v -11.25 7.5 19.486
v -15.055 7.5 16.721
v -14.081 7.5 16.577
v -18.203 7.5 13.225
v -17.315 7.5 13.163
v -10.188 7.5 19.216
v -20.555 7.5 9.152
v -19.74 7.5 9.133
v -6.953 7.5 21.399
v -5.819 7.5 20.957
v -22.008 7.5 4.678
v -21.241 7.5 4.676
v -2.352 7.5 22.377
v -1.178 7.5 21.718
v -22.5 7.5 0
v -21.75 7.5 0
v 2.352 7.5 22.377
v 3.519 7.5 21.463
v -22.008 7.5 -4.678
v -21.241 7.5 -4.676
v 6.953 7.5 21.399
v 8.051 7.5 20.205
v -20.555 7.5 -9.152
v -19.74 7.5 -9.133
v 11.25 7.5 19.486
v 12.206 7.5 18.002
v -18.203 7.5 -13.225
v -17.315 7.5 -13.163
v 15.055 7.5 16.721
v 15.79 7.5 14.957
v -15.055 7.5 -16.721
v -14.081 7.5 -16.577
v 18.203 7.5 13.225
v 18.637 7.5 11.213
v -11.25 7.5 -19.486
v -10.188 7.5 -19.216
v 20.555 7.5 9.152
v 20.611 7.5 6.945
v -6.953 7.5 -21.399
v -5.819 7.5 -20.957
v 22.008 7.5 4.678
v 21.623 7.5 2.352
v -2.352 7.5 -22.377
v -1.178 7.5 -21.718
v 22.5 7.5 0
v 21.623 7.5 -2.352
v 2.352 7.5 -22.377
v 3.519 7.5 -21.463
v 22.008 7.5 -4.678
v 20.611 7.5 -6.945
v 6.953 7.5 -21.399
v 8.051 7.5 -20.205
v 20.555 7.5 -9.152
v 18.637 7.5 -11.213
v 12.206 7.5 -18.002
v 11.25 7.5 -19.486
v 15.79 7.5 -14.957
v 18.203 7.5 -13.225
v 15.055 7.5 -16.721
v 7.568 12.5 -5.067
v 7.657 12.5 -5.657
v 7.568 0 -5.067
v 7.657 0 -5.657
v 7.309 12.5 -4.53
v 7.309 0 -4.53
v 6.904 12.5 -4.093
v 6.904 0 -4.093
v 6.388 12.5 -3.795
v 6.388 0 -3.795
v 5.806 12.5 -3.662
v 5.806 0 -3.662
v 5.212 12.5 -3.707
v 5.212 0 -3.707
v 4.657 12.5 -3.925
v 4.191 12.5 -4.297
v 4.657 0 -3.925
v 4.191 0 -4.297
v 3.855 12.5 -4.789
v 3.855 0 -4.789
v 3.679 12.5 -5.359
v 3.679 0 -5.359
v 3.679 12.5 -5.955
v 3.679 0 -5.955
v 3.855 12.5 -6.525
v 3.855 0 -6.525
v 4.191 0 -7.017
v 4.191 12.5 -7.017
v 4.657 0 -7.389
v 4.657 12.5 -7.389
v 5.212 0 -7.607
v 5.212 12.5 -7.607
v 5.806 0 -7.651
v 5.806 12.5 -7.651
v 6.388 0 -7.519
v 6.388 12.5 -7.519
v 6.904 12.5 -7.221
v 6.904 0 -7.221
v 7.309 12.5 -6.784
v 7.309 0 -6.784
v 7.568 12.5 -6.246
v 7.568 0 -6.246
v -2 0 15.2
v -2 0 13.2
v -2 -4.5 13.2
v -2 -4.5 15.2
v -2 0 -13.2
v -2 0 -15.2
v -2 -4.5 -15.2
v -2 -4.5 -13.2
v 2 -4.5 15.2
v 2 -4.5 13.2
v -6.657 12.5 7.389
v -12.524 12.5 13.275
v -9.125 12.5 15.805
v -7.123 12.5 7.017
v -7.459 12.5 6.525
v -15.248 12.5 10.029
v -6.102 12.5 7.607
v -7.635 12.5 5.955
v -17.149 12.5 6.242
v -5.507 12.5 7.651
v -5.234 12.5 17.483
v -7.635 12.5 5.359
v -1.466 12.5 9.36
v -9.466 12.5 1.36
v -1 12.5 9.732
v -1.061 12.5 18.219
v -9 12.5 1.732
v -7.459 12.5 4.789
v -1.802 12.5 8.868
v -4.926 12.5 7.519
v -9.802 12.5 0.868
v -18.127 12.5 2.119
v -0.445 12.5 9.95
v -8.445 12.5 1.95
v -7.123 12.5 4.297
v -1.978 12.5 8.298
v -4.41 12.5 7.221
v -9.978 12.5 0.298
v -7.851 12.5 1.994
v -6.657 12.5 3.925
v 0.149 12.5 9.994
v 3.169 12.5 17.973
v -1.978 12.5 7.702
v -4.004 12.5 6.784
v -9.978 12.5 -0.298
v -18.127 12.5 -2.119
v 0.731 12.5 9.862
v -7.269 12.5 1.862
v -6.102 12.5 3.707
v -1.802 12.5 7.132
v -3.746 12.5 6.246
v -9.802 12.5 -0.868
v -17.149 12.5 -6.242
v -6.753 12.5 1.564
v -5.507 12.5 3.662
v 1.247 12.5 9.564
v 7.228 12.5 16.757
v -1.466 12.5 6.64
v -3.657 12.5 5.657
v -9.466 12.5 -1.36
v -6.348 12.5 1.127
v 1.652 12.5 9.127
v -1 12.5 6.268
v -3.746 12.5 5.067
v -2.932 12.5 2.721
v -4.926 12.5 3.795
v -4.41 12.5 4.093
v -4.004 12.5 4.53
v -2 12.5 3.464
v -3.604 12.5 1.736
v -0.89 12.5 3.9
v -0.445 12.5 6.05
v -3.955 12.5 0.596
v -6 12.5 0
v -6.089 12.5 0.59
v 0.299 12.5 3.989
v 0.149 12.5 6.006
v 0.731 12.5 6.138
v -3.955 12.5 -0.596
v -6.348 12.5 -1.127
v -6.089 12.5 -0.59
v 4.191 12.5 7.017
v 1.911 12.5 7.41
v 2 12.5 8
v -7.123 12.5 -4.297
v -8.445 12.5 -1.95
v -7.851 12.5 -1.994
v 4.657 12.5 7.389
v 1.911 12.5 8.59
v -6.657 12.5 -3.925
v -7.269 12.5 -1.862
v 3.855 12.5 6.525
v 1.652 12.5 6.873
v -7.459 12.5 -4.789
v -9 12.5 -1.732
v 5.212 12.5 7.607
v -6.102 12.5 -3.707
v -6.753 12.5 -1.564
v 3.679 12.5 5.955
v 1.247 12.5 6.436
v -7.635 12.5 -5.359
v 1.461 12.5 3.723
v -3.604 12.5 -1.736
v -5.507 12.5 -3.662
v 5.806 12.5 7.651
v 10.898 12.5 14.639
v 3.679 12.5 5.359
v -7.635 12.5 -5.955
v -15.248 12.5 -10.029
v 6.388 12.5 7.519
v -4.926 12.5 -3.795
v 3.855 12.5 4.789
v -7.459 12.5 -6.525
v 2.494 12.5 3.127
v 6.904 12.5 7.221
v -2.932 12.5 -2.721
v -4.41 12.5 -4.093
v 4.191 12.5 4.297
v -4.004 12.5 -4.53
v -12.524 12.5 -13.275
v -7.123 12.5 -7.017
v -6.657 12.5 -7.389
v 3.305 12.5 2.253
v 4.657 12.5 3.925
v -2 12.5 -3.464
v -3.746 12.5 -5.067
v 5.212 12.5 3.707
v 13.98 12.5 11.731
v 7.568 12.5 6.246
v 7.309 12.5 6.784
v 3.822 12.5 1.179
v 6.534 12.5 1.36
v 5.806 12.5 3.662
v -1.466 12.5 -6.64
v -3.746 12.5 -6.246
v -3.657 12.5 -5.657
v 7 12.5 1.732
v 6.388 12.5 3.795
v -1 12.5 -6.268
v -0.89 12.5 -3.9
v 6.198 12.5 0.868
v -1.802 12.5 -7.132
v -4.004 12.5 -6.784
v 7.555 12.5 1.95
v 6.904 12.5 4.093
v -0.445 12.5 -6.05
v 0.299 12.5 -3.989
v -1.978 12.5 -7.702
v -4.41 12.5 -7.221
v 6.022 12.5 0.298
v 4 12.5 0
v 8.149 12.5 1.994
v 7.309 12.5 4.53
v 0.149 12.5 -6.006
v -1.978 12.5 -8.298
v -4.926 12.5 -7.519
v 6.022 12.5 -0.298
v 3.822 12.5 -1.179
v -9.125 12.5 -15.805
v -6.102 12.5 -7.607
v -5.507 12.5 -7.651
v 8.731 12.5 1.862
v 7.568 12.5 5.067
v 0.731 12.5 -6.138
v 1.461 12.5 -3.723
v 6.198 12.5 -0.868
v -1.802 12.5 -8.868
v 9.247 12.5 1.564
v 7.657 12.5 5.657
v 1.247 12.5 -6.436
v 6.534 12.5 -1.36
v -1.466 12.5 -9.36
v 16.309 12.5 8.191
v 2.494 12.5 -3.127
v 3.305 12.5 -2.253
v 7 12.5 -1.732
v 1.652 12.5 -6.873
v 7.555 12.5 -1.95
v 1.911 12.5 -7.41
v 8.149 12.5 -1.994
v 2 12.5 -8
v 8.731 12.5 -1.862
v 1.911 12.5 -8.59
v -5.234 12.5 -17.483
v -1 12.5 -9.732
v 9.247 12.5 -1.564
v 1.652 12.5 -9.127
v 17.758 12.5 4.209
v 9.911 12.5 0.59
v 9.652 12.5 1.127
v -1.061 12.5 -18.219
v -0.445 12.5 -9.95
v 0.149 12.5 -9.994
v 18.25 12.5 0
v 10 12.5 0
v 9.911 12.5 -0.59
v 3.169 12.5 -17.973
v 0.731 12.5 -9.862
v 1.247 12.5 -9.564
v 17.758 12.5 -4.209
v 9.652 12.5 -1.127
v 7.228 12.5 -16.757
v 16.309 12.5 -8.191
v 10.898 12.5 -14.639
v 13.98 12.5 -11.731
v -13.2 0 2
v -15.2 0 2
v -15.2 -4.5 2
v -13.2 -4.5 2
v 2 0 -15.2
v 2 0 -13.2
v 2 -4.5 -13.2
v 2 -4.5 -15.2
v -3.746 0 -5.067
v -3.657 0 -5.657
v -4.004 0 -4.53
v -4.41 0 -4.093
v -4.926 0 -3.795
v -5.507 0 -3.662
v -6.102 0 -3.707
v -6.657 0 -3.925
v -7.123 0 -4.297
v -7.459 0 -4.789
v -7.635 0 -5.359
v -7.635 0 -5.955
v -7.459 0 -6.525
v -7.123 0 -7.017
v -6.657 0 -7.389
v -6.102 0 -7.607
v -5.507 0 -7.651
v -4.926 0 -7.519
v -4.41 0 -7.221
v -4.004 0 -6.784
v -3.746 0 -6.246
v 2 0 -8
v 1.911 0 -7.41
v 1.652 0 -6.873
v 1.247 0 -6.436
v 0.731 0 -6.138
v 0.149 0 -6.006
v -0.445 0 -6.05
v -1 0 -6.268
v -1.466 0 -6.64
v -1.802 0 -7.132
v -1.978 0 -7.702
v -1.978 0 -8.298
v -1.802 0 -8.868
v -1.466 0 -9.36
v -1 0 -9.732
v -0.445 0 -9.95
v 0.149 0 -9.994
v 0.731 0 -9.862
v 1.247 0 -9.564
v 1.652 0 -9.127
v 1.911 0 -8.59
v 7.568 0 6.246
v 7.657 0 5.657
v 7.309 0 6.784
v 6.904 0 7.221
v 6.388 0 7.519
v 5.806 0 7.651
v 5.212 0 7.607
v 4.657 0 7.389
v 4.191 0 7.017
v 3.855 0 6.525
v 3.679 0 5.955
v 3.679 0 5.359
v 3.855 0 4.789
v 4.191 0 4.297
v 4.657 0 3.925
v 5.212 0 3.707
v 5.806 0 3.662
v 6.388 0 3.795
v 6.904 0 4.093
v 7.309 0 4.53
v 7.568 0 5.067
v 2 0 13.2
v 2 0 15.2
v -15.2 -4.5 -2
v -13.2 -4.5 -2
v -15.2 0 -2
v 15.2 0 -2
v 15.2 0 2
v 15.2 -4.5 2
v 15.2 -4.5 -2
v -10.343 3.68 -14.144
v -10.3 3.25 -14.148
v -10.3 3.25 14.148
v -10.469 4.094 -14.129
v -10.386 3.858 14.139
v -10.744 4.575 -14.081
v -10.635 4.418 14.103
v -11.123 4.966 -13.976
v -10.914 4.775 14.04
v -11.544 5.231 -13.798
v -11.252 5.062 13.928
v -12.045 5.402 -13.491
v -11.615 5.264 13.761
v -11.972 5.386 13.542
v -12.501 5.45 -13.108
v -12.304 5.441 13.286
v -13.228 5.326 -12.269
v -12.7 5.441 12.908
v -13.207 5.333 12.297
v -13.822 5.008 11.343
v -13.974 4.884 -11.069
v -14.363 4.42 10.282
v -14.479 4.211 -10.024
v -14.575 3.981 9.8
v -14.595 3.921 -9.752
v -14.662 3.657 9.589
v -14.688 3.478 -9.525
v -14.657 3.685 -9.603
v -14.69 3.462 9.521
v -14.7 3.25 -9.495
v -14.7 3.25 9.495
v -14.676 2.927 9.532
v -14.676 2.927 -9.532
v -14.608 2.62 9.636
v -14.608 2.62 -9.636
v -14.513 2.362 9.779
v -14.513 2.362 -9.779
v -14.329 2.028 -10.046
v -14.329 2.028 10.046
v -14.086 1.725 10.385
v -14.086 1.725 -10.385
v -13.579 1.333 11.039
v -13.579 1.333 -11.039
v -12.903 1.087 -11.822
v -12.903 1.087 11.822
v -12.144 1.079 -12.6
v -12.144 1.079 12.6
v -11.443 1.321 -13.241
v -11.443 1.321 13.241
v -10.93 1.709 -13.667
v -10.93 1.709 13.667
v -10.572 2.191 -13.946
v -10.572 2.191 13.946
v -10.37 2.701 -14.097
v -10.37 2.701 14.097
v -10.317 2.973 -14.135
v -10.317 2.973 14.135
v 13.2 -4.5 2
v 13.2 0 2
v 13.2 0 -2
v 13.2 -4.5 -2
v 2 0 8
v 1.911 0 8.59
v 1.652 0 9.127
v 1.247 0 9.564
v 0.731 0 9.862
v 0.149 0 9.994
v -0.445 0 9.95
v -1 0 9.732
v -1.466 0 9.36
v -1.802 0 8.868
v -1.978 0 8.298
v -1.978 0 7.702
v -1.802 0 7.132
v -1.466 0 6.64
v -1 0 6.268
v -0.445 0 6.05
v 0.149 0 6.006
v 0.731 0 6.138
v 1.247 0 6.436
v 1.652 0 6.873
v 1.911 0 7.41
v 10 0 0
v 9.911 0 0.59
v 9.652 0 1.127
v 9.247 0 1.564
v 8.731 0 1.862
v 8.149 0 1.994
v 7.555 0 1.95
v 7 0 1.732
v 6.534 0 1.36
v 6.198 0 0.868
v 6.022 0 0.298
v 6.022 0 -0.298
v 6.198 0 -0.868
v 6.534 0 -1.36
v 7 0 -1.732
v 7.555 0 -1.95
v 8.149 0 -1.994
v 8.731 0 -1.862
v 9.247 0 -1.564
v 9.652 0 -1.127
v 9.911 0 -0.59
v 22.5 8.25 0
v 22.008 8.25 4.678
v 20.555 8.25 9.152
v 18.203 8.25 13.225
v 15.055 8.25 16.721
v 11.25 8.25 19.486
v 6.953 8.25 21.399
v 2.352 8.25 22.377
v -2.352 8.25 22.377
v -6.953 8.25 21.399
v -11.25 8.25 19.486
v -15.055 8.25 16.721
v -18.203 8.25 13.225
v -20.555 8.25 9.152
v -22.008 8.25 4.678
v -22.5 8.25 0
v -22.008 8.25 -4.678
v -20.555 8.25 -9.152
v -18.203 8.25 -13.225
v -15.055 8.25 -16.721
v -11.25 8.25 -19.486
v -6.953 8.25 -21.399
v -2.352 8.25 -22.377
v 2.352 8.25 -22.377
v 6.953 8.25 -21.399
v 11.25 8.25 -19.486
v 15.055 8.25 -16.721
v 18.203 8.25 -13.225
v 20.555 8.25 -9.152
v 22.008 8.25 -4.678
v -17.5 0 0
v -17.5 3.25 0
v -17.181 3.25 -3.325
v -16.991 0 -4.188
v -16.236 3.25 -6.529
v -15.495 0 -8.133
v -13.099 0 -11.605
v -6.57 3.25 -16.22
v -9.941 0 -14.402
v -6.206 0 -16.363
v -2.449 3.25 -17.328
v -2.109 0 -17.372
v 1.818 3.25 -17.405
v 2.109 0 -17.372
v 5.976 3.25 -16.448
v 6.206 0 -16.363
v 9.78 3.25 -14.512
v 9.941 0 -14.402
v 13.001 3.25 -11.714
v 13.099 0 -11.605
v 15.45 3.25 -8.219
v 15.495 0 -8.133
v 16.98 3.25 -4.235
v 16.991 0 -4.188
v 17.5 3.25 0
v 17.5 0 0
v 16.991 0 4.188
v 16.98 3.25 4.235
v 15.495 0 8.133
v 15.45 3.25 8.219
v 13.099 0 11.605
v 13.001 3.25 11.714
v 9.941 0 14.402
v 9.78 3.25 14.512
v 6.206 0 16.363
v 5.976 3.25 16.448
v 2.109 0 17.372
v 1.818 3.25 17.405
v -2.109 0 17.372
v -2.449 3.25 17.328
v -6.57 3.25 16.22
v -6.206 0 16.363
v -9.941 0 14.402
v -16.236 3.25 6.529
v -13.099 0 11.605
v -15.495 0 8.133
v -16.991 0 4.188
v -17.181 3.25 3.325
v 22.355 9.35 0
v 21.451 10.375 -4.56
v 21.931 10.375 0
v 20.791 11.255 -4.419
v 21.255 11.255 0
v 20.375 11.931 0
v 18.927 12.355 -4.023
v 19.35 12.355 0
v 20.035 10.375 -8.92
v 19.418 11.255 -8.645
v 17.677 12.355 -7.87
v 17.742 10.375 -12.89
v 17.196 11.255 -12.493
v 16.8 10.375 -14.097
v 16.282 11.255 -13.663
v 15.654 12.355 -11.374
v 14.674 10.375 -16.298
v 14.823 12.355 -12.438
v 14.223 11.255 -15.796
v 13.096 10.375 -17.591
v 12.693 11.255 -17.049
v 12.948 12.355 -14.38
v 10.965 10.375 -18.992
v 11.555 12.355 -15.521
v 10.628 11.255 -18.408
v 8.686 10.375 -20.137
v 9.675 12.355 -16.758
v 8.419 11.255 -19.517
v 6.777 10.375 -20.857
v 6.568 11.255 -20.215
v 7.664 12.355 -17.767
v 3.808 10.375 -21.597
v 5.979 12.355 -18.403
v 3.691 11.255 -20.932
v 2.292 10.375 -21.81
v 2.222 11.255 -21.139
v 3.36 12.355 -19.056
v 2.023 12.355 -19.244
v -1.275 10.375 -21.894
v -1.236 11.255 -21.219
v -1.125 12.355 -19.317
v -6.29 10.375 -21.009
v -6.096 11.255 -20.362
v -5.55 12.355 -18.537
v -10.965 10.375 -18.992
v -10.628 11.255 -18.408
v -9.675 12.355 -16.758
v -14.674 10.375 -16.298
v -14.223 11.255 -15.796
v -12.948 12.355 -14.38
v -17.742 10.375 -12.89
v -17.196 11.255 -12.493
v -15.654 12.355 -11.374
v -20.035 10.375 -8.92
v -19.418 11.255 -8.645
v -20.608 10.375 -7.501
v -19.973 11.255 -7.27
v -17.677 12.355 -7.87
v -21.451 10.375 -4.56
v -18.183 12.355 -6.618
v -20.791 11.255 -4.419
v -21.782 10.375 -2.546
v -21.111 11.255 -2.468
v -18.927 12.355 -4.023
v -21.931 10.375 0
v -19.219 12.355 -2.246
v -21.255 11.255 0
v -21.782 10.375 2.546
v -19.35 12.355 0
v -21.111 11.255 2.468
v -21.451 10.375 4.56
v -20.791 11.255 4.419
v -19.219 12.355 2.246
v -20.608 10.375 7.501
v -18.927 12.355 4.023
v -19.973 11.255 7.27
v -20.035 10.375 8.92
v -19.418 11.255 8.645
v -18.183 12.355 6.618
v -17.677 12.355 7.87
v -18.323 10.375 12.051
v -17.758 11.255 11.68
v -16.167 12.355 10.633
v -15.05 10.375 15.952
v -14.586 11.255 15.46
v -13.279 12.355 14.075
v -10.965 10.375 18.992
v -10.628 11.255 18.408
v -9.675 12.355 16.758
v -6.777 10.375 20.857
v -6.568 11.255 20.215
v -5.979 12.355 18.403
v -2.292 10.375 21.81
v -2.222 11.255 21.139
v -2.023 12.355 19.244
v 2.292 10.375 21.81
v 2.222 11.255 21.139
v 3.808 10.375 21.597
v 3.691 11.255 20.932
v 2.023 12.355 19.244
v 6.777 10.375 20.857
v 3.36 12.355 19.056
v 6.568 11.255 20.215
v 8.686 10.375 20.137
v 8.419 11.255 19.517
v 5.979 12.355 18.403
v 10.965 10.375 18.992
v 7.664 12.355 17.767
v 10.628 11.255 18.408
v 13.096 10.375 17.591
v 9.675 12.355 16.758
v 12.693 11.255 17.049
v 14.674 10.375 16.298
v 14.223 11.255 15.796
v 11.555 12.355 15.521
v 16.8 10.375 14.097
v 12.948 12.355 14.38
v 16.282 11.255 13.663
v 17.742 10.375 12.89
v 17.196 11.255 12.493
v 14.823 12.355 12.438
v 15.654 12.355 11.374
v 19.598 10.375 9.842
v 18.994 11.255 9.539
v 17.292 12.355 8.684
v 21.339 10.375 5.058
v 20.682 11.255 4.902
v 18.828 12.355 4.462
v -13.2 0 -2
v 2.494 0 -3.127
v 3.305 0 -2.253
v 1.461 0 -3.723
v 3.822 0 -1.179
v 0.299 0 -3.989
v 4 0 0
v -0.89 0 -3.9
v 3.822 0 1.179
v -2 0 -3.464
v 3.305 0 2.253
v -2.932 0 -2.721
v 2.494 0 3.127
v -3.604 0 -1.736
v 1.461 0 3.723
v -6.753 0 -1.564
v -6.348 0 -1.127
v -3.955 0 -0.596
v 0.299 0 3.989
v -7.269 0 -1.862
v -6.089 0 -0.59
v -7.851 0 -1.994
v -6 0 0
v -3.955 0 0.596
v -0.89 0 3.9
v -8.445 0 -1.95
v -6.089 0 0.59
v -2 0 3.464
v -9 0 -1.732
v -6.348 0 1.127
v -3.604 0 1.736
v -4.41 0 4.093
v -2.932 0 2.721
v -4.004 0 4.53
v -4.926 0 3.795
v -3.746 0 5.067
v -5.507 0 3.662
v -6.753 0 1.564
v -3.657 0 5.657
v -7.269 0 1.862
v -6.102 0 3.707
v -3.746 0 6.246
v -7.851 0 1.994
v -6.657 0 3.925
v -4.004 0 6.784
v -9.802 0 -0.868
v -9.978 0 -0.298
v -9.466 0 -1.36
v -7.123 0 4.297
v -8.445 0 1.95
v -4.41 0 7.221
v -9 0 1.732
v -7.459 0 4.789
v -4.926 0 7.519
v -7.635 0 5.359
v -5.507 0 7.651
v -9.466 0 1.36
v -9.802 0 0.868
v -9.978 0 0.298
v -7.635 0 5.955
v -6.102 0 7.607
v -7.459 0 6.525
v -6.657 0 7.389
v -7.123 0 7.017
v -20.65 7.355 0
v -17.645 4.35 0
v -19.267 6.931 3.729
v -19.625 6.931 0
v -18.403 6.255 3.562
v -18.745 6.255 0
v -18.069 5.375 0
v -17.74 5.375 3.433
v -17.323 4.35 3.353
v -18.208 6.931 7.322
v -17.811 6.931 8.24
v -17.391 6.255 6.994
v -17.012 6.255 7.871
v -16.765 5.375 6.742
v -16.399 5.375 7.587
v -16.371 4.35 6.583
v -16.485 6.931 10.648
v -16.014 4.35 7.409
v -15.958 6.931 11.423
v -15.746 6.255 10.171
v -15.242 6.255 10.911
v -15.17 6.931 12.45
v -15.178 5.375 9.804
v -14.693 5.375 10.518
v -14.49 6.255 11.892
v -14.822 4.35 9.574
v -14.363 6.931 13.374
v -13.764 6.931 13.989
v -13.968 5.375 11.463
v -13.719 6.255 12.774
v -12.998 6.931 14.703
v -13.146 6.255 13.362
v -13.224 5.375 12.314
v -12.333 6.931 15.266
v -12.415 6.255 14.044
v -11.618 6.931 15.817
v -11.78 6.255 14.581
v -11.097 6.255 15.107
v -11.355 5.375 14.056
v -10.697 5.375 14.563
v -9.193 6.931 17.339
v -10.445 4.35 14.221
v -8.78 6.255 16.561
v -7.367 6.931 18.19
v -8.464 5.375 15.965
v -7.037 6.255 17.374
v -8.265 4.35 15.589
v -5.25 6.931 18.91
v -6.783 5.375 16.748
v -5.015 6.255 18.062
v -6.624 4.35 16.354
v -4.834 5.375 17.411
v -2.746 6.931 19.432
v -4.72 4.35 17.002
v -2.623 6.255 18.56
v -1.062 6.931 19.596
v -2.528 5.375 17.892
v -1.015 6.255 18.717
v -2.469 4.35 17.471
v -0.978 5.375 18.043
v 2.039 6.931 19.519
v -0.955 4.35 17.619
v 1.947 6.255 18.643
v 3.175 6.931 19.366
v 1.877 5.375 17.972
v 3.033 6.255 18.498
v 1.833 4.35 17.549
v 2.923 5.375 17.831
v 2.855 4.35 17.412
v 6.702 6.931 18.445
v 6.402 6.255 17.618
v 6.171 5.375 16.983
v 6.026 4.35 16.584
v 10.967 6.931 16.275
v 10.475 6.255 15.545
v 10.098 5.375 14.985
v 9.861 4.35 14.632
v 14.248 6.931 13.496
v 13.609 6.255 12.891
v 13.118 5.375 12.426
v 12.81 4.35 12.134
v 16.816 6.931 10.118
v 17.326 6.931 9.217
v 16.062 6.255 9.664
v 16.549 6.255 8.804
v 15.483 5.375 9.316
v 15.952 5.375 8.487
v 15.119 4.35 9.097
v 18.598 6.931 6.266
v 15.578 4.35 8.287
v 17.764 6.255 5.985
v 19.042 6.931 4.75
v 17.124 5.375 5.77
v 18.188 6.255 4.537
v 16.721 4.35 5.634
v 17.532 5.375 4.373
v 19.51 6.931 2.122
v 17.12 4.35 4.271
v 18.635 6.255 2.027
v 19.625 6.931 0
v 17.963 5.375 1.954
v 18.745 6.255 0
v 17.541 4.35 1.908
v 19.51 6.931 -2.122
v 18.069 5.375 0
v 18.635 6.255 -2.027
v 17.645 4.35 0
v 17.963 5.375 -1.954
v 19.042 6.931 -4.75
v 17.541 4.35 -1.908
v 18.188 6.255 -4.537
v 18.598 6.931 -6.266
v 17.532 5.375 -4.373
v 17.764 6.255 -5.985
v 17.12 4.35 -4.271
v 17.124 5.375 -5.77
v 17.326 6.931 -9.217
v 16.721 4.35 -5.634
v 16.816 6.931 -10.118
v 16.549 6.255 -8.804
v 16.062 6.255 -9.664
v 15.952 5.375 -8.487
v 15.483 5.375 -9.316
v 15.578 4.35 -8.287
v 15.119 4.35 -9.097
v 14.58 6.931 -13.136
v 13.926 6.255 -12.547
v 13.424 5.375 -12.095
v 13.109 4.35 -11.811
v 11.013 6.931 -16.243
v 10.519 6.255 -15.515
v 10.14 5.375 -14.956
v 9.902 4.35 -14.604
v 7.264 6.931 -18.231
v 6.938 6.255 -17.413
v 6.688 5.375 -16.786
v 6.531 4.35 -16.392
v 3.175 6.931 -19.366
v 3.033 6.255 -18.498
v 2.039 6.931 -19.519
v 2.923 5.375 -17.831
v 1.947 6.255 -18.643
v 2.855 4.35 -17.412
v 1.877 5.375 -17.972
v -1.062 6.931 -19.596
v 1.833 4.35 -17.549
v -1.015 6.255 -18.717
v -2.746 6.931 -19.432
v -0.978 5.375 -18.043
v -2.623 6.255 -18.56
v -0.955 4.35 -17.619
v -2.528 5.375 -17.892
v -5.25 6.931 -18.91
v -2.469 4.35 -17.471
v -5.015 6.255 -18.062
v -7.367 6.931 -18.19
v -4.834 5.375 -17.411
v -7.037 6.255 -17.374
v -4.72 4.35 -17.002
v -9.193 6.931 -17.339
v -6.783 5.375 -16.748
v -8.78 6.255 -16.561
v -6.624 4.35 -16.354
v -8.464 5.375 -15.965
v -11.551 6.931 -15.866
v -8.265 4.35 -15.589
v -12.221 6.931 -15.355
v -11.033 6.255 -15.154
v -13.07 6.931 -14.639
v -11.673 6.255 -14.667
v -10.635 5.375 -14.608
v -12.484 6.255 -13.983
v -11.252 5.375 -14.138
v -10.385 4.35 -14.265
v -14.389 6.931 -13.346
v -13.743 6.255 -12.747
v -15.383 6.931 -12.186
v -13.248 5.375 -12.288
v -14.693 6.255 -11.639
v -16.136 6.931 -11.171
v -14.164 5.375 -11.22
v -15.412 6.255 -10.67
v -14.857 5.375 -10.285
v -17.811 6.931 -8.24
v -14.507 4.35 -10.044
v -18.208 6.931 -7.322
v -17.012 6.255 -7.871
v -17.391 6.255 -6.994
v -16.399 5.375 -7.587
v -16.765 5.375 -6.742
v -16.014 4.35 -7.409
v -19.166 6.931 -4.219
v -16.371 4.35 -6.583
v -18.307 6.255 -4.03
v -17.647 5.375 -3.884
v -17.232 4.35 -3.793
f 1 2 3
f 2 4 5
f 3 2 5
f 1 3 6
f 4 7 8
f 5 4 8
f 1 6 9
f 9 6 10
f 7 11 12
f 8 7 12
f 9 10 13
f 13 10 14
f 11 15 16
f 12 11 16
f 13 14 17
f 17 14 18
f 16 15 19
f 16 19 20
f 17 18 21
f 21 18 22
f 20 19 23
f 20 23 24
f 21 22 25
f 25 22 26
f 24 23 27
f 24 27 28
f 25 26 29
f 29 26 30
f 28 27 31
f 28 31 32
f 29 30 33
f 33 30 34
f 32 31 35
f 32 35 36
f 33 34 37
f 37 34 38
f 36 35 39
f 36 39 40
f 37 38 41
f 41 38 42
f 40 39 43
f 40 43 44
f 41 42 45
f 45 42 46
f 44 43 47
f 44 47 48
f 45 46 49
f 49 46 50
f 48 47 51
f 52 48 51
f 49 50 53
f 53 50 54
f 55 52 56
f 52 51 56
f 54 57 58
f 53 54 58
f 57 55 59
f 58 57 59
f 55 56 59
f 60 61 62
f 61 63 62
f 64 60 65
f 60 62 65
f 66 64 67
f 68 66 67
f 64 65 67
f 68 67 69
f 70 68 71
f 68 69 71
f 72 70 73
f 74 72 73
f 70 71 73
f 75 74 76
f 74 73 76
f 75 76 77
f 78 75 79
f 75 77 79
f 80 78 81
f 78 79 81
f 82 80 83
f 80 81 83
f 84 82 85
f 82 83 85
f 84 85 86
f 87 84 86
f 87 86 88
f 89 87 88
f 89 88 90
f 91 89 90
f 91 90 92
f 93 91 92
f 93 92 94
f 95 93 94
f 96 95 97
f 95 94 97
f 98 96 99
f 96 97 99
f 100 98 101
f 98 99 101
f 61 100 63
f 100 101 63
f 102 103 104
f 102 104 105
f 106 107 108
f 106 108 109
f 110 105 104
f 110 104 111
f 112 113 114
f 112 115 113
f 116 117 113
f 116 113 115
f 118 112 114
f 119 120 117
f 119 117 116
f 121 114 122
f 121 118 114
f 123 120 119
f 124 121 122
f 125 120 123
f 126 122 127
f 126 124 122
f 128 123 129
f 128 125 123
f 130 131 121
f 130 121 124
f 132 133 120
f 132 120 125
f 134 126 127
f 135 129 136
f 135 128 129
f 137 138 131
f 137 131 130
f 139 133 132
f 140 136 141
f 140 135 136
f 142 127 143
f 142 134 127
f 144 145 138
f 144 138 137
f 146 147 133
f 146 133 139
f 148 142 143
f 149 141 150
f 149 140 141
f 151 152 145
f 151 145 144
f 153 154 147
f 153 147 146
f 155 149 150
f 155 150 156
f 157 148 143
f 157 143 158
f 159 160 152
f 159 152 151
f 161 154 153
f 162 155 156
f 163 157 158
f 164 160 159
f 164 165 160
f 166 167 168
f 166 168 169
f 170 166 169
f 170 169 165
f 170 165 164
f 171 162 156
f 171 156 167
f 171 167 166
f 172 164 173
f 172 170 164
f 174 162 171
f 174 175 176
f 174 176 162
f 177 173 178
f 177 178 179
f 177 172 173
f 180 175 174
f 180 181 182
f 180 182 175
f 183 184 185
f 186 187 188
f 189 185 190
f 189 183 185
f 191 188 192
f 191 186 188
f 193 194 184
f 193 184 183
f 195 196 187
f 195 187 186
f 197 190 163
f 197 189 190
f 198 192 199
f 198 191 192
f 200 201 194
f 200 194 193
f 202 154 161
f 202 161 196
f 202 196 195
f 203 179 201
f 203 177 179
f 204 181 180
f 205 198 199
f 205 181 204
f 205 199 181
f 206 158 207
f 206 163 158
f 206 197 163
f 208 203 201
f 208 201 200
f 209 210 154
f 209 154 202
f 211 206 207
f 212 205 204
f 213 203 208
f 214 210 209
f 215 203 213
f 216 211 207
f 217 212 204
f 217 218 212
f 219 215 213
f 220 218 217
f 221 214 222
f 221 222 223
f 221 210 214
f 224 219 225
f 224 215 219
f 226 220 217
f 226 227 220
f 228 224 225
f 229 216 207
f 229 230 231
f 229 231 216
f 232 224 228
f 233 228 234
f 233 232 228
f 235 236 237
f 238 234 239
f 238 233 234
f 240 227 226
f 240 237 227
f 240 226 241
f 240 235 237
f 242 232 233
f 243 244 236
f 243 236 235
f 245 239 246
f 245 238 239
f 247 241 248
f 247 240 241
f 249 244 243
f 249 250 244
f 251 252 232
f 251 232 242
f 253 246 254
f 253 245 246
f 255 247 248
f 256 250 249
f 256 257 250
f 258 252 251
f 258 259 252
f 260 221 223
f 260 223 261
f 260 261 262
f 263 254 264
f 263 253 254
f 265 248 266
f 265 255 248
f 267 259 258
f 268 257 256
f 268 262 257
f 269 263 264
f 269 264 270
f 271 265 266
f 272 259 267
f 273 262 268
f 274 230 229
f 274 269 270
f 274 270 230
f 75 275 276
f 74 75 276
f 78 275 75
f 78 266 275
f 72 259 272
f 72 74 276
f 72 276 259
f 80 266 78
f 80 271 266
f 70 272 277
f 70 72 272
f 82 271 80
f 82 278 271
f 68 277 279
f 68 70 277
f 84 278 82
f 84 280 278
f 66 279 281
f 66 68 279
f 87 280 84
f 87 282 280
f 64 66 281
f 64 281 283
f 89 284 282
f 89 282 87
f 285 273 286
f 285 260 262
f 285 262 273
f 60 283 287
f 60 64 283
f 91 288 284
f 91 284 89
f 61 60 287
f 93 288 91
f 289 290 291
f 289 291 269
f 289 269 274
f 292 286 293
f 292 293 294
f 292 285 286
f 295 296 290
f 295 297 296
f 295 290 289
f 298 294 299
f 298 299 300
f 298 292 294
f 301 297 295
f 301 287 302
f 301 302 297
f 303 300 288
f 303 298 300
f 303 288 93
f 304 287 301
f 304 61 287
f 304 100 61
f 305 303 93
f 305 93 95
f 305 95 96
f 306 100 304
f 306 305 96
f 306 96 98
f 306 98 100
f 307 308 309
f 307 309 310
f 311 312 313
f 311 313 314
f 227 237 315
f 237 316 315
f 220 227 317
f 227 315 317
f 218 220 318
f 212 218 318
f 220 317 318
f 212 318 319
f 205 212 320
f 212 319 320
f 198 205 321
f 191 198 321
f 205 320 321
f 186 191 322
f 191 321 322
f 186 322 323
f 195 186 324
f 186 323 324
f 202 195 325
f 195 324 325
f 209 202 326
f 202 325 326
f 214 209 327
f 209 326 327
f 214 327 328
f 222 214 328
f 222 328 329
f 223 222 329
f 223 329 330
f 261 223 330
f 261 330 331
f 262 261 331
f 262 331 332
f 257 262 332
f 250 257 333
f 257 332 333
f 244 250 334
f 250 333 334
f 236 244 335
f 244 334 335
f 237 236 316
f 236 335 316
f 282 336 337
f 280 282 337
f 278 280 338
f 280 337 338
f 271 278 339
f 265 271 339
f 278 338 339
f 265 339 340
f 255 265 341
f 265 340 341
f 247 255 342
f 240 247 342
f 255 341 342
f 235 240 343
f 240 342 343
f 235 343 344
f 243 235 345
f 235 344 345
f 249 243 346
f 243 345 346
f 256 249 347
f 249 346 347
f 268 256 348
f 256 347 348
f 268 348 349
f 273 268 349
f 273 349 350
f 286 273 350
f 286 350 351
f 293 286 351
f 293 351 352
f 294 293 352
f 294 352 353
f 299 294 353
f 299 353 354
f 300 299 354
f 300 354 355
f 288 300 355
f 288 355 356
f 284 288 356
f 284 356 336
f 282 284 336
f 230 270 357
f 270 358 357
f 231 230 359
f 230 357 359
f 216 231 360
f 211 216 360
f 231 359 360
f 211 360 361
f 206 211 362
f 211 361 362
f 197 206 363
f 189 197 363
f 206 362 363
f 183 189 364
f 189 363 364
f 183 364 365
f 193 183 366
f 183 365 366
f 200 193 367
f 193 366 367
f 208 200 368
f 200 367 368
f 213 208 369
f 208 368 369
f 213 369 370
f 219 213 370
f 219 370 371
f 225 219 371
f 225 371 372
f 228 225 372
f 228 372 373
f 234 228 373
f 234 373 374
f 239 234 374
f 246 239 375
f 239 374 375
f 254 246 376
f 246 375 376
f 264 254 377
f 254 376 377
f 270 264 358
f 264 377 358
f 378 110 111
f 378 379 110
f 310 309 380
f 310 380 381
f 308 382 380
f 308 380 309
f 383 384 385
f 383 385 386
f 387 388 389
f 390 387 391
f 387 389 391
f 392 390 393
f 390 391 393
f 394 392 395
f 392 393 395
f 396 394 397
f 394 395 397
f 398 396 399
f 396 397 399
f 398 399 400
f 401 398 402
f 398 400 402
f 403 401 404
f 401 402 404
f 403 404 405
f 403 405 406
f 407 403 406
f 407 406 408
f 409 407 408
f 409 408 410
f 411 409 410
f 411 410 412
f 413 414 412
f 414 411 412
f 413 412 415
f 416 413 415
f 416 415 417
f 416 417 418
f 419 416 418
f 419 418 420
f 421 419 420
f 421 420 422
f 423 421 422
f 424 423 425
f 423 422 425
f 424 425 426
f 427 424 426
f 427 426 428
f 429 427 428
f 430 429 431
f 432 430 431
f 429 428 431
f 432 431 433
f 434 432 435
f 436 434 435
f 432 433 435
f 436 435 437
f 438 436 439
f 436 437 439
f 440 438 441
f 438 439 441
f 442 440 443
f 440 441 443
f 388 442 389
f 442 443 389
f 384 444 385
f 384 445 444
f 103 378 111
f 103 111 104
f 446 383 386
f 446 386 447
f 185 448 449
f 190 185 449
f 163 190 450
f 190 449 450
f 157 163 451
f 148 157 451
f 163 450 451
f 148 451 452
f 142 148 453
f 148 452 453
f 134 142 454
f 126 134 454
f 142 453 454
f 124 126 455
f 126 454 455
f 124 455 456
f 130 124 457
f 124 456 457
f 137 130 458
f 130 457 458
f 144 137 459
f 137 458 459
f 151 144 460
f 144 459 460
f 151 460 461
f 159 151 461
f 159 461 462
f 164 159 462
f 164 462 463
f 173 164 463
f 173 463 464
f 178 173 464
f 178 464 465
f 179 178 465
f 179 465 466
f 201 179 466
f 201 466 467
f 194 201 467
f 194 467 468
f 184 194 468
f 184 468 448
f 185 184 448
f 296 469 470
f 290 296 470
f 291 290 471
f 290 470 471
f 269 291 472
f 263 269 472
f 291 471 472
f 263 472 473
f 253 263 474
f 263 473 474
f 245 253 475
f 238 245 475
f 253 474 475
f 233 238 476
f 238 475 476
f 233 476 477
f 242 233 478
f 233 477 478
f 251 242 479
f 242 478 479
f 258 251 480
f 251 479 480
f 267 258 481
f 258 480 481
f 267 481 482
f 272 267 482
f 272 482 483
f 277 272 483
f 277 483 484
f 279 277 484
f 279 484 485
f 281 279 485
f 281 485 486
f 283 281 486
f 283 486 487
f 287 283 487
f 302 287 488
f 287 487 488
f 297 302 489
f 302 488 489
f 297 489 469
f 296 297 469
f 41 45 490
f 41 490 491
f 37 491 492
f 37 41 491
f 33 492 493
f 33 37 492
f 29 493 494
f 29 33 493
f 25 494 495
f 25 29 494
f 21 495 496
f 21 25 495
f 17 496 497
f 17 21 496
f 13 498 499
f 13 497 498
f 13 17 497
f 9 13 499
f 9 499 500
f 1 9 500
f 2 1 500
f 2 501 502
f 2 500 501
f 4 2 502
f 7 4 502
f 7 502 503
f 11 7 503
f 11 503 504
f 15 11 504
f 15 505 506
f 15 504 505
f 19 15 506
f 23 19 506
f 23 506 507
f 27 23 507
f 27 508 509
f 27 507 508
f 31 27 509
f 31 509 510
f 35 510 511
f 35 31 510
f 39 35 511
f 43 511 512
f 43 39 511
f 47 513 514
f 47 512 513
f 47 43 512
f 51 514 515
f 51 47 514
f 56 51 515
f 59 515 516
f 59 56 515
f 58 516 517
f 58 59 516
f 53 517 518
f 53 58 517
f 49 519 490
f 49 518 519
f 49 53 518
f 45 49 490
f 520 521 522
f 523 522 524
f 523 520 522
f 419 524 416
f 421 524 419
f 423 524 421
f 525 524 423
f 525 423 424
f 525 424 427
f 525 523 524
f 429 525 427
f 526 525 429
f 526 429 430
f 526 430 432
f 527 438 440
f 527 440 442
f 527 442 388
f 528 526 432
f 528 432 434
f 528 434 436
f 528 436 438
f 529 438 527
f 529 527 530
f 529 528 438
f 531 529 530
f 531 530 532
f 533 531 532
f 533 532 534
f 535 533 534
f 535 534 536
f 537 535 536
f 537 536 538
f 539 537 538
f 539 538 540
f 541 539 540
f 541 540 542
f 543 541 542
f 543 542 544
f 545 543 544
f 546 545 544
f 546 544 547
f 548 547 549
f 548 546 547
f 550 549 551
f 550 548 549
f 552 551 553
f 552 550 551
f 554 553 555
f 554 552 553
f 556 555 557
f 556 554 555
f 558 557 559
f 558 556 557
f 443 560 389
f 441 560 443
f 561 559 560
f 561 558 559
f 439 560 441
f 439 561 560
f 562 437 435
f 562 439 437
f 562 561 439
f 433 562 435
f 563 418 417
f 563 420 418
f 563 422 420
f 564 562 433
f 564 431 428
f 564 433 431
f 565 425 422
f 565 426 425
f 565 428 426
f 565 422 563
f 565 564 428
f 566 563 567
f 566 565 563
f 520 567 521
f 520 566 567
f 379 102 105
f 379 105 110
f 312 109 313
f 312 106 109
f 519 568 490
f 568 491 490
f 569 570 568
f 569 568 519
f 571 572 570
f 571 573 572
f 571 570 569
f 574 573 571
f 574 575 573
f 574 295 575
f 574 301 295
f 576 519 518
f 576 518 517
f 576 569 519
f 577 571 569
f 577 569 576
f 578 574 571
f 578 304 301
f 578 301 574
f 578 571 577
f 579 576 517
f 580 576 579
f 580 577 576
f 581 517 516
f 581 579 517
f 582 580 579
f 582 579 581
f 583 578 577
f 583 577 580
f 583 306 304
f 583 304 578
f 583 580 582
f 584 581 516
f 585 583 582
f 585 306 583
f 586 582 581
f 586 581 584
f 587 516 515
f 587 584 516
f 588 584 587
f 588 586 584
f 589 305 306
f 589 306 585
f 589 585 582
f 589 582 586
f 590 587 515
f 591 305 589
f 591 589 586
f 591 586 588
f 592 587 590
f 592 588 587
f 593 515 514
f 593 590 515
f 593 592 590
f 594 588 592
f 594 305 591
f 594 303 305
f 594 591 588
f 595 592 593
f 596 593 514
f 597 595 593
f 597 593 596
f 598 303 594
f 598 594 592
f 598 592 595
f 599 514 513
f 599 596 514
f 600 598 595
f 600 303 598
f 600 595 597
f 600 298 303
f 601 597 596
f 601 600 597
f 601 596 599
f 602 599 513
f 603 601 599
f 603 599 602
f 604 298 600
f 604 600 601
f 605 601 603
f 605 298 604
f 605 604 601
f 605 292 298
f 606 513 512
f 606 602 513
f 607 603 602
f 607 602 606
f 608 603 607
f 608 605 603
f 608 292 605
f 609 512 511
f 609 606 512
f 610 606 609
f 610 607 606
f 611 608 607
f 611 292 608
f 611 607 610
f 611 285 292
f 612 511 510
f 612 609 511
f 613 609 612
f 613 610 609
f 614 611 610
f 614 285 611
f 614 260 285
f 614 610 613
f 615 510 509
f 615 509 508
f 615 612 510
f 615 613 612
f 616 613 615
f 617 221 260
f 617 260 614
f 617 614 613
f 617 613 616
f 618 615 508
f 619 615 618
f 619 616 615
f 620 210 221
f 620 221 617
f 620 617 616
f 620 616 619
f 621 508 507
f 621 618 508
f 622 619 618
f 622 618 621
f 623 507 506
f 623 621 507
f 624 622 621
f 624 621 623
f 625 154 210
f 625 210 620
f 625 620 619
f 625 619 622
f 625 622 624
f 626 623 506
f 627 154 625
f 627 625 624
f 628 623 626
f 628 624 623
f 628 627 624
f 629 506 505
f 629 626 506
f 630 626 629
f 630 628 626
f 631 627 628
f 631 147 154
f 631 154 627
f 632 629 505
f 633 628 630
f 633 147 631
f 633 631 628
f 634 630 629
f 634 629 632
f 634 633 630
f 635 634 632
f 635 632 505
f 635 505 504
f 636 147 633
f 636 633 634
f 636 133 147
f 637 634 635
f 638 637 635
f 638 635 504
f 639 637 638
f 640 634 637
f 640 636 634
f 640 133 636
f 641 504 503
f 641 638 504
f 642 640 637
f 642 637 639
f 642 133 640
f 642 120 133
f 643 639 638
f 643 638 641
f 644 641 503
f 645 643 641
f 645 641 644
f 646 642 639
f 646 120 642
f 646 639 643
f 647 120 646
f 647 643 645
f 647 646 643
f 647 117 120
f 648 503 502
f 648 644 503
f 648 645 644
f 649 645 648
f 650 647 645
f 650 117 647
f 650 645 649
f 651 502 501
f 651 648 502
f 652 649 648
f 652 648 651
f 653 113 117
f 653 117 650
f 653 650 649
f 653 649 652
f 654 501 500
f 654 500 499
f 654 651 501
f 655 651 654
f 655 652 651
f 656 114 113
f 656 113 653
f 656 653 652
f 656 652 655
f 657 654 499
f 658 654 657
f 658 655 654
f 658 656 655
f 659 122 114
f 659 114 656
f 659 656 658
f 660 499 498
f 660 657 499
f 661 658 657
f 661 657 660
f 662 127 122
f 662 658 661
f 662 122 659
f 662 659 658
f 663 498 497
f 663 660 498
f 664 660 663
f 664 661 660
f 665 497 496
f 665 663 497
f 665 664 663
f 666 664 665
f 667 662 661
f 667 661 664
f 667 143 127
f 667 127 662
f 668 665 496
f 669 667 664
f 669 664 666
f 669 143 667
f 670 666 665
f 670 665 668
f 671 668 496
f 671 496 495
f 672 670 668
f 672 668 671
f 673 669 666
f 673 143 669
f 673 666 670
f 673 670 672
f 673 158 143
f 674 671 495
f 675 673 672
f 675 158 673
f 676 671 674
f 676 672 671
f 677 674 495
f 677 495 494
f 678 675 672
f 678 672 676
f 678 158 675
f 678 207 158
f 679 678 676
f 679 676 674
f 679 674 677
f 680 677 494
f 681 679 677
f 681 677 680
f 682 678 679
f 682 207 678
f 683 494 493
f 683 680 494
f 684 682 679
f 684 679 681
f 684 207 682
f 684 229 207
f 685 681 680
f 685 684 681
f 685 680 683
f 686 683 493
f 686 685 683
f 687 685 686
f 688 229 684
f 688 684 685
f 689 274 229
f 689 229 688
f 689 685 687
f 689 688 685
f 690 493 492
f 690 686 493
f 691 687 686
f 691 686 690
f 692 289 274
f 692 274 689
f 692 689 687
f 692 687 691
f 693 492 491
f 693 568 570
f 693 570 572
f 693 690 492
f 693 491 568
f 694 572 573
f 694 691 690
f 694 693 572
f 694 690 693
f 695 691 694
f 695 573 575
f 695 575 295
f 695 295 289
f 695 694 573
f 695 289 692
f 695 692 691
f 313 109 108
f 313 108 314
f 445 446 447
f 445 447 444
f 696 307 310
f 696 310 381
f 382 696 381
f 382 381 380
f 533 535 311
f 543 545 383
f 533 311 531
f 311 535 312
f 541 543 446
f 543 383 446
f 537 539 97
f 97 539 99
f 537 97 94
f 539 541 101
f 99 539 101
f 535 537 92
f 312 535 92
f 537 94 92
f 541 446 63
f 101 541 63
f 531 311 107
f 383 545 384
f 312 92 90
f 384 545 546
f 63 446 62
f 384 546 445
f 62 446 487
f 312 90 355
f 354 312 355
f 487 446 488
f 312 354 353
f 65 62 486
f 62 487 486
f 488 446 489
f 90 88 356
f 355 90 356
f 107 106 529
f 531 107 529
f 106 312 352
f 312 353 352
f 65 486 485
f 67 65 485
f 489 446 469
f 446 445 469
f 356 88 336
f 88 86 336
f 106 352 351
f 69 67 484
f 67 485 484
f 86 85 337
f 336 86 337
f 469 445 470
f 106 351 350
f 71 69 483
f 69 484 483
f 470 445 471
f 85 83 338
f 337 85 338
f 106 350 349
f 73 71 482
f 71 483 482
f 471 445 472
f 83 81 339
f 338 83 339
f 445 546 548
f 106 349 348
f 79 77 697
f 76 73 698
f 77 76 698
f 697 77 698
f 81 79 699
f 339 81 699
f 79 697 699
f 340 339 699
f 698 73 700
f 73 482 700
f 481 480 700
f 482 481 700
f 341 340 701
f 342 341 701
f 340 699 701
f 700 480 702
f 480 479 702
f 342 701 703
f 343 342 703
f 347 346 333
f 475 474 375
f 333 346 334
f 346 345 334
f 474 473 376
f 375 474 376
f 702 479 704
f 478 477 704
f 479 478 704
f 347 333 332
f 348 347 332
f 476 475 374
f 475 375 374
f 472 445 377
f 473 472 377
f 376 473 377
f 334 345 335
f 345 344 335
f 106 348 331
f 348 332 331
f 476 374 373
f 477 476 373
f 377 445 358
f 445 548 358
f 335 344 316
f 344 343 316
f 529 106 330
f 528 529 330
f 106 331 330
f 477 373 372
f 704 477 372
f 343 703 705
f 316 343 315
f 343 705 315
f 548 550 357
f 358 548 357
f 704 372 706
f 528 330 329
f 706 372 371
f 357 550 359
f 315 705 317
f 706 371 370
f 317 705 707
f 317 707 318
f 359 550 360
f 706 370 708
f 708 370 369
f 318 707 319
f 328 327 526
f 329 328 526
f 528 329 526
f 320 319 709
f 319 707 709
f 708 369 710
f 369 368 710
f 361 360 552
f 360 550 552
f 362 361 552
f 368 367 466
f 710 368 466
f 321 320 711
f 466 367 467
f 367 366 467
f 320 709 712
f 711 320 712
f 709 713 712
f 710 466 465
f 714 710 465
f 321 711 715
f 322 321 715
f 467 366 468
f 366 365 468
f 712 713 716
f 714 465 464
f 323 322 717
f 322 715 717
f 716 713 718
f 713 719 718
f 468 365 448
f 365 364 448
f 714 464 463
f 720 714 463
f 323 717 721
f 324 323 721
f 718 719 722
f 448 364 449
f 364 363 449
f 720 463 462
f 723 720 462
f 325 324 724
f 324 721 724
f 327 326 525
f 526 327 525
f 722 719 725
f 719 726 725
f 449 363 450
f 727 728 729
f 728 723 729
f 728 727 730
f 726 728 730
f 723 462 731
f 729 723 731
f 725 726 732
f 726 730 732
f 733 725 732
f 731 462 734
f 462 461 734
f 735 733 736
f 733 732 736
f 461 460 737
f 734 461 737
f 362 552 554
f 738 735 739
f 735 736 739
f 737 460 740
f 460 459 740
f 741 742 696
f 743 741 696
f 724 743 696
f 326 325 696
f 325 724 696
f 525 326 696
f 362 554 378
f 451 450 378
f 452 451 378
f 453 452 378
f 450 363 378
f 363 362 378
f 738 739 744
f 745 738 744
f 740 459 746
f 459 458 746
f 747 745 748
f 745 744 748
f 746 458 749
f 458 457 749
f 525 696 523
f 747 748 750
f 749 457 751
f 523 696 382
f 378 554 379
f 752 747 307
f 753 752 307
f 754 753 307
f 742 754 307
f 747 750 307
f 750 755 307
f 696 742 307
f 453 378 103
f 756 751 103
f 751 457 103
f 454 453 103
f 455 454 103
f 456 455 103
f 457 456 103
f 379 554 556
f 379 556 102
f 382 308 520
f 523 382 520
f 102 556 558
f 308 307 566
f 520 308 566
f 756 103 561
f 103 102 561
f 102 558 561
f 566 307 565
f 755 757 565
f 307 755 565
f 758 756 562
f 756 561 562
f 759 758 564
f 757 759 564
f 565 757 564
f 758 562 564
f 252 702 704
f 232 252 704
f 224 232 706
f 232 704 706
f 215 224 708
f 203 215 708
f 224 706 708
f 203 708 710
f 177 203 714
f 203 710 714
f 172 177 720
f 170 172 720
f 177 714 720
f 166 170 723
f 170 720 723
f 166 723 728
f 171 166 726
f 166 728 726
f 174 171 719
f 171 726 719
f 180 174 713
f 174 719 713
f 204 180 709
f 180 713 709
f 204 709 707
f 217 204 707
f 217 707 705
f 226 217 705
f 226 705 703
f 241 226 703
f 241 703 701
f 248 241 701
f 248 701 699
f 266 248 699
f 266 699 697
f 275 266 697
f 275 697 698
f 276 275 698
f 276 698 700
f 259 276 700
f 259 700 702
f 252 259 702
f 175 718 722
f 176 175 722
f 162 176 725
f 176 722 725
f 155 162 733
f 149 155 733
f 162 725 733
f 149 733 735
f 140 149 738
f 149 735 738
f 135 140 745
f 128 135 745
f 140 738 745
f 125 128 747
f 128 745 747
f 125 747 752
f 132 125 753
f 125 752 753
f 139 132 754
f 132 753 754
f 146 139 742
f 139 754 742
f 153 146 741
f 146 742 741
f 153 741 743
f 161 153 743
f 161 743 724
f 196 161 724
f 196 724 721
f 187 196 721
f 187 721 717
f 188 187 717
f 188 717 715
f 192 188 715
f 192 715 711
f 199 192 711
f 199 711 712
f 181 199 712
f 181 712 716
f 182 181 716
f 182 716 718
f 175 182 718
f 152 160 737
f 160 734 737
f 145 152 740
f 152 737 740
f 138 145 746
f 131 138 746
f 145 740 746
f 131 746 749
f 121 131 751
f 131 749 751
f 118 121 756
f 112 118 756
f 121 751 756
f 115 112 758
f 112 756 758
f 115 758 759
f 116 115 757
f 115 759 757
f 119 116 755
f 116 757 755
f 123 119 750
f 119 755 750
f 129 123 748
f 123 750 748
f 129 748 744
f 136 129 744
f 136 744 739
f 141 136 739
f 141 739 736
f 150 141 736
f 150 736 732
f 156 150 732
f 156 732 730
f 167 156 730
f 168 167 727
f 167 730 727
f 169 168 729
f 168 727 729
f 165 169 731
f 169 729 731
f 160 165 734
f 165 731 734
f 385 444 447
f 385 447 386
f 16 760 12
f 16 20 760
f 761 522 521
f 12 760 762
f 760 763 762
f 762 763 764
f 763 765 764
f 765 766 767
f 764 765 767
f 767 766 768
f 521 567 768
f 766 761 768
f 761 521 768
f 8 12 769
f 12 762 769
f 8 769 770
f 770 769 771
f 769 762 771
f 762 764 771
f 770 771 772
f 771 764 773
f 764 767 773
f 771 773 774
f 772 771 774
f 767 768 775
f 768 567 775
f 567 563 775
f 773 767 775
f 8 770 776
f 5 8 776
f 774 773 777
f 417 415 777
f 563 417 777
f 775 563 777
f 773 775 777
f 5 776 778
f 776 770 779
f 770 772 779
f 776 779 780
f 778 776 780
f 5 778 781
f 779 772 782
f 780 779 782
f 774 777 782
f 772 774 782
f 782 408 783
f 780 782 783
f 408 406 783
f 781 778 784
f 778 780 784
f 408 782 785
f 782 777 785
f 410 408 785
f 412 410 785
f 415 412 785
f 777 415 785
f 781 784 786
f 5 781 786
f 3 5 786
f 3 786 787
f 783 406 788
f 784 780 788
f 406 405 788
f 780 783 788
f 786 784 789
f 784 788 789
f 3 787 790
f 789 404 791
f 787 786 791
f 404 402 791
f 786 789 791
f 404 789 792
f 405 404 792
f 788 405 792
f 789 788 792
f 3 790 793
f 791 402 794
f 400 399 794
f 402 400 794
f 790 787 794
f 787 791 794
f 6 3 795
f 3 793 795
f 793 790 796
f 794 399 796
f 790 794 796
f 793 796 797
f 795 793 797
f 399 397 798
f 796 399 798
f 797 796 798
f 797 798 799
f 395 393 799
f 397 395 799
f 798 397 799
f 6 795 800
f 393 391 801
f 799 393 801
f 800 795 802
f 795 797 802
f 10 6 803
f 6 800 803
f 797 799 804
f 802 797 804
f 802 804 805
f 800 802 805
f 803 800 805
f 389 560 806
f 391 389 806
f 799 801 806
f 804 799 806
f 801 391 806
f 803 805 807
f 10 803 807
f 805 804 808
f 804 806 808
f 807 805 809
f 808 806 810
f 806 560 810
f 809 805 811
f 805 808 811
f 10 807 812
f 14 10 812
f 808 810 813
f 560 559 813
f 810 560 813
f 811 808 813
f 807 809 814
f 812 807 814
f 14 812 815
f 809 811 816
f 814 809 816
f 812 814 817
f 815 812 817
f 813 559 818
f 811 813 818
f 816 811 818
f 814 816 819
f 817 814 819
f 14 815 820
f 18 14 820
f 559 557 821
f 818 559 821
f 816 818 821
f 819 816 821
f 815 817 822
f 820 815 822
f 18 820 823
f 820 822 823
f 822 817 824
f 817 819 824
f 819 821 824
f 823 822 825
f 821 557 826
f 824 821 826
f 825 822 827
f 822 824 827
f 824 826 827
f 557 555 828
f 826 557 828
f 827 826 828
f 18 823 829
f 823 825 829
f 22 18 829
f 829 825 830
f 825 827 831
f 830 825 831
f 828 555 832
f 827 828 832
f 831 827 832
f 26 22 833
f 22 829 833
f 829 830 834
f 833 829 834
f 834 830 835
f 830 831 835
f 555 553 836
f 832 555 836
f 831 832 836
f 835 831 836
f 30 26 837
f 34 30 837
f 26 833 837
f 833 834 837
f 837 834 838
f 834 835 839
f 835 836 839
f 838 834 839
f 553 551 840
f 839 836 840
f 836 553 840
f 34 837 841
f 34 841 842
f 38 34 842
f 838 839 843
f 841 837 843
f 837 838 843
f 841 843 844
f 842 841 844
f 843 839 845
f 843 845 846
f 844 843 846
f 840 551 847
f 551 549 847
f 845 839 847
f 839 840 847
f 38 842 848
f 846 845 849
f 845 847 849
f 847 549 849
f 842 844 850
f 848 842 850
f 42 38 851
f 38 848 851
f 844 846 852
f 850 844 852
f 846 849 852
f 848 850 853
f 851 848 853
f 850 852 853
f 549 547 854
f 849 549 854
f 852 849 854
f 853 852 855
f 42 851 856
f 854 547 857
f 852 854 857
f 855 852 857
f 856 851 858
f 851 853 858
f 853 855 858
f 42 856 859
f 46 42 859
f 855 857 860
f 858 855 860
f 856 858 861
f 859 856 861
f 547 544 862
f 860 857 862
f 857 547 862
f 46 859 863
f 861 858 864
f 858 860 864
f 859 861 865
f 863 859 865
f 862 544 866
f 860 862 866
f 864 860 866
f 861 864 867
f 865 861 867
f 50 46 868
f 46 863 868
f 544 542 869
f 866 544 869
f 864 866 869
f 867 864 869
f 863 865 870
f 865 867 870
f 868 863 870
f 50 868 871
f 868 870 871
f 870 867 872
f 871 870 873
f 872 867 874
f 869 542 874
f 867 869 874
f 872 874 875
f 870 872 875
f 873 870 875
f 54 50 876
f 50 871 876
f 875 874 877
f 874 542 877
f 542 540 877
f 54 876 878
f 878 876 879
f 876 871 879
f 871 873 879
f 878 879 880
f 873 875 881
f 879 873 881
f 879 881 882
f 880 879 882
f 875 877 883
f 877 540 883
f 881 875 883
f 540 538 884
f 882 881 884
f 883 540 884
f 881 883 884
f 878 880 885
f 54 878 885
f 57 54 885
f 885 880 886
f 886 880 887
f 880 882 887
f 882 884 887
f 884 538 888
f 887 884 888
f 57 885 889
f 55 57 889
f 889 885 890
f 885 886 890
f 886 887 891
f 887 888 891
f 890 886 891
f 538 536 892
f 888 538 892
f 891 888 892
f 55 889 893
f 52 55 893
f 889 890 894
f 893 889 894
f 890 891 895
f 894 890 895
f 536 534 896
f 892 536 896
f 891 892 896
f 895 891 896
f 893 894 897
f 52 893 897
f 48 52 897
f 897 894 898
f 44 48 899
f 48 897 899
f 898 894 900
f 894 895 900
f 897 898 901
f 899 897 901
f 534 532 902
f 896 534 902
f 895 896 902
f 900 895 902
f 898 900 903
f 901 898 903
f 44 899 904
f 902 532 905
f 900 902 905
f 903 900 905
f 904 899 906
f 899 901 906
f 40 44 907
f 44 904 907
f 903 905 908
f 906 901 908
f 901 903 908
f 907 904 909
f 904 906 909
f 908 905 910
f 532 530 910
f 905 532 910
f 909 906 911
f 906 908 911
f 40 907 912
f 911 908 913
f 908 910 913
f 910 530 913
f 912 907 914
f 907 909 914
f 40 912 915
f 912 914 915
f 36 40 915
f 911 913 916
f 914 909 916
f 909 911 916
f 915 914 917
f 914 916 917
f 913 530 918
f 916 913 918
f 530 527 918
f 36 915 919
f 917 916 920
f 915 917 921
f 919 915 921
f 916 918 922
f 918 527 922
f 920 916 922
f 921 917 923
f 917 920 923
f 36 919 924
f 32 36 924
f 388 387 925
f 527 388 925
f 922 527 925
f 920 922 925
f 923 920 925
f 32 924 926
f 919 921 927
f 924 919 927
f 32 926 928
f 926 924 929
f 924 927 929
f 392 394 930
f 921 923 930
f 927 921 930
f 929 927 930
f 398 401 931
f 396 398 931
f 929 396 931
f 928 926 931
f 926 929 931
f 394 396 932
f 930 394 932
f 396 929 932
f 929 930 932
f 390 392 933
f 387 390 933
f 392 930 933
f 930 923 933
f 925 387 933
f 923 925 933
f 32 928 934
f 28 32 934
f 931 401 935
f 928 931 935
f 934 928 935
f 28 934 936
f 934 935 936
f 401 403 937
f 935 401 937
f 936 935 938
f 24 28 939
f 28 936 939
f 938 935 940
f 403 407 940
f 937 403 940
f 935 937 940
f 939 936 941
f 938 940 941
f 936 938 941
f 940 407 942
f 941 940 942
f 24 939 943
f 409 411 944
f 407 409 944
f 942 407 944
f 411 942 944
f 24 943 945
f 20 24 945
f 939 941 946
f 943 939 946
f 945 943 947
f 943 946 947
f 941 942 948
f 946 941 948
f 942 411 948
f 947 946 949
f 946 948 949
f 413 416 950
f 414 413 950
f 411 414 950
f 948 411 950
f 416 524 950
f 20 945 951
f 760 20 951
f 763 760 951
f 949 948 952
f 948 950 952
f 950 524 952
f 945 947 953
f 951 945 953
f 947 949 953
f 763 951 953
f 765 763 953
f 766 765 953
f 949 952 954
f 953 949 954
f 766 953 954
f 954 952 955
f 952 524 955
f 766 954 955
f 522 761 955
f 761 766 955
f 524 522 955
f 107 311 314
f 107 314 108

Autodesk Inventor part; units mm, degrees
ref_plane "YZ Plane" through (0, 0, 0) normal (1, 0, 0) x (0, 1, 0)
ref_plane "XZ Plane" through (0, 0, 0) normal (0, 1, 0) x (-1, 0, 0)
ref_plane "XY Plane" through (0, 0, 0) normal (0, 0, 1) x (1, 0, 0)
sketch "Эскиз1" plane through (0, 0, 0) normal (0, 1, 0) x (-1, 0, 0)
  circle A0 centre (0, 0) radius 17.5
  dimension "d0" = 35
extrude "Выдавливание1" add sketch "Эскиз1" along normal blind 7.5
sketch "Эскиз2" plane through (0, 7.5, 0) normal (0, 1, 0) x (1, 0, 0)
  circle A0 centre (0, 0) radius 22.5
  dimension "d3" = 45
extrude "Выдавливание2" add sketch "Эскиз2" along normal blind 5
fillet "Сопряжение1" radius 4.25 1 edges at (17.5, 7.5, 0)
fillet "Сопряжение2" radius 4.25 1 edges at (-22.5, 12.5, 0)
sketch "Эскиз3" plane through (0, 0, 0) normal (0, -1, 0) x (1, 0, 0)
  line L0 (-24.85, 5.95) -> (-15.15, 5.95)
  line L1 (-15.15, 5.95) -> (-15.15, -5.95)
  line L2 (-15.15, -5.95) -> (-24.85, -5.95)
  line L3 (-24.85, -5.95) -> (-24.85, 5.95)
  line L4 (-4.7, 15.3) -> (-4.7, 25)
  line L5 (-4.7, 25) -> (5, 25)
  line L6 (5, 25) -> (5, 15.3)
  line L7 (5, 15.3) -> (-4.7, 15.3)
  line L8 (5, -15.3) -> (5, -25)
  line L9 (5, -25) -> (-4.7, -25)
  line L10 (-4.7, -25) -> (-4.7, -15.3)
  line L11 (-4.7, -15.3) -> (5, -15.3)
  line L12 (15.15, 5.95) -> (24.85, 5.95)
  line L13 (24.85, 5.95) -> (24.85, -5.95)
  line L14 (24.85, -5.95) -> (15.15, -5.95)
  line L15 (15.15, -5.95) -> (15.15, 5.95)
  circle A0 centre (0, 8) radius 2
  circle A1 centre (-5.6569, -5.6569) radius 2
  circle A2 centre (0, -8) radius 2
  circle A3 centre (0, 0) radius 4
  circle A4 centre (8, 0) radius 2
  circle A5 centre (-8, 0) radius 2
  circle A6 centre (5.6569, -5.6569) radius 2
  circle A7 centre (-5.6569, 5.6569) radius 2
  circle A8 centre (5.6569, 5.6569) radius 2
  circle A9 centre (0, 0) radius 35
extrude "Выдавливание3" cut sketch "Эскиз3" against normal through all contours A0 | A1 | A2 | A3 | A4 | A5 | A6 | A7 | A8
sketch "Эскиз4" plane through (0, 0, 0) normal (0, -1, 0) x (1, 0, 0)
  circle A0 centre (-8, 0) radius 2 projected
  line L0 (-8, 0) -> (-13.2, 0)
  line L1 (-13.2, 0) -> (-13.2, -2)
  line L2 (-13.2, -2) -> (-15.2, -2)
  line L3 (-15.2, -2) -> (-15.2, 2)
  line L4 (-15.2, 2) -> (-13.2, 2)
  line L5 (-13.2, 2) -> (-13.2, 0)
  line L6 (2, -15.2) -> (-2, -15.2)
  line L7 (2, -13.2) -> (2, -15.2)
  line L8 (-2, -13.2) -> (0, -13.2)
  line L9 (0, -13.2) -> (2, -13.2)
  line L10 (-2, -15.2) -> (-2, -13.2)
  line L11 (15.2, 2) -> (15.2, -2)
  line L12 (13.2, 2) -> (15.2, 2)
  line L13 (13.2, -2) -> (13.2, 0)
  line L14 (13.2, 0) -> (13.2, 2)
  line L15 (15.2, -2) -> (13.2, -2)
  line L16 (-2, 15.2) -> (2, 15.2)
  line L17 (-2, 13.2) -> (-2, 15.2)
  line L18 (2, 13.2) -> (0, 13.2)
  line L19 (0, 13.2) -> (-2, 13.2)
  line L20 (2, 15.2) -> (2, 13.2)
  point P0 (0, 0)
  dimension "d10" = 5.2
  dimension "d11" = 2
  dimension "d12" = 4
  dimension "d15" = 360
extrude "Выдавливание4" add sketch "Эскиз4" along normal blind 4.5 contours L1 L2 L3 L4 L5 | L6 L10 L8 L9 L7 | L11 L15 L13 L14 L12 | L16 L20 L18 L19 L17
sketch "Эскиз6" plane through (0, 0, 0) normal (0, -1, 0) x (1, 0, 0)
  circle A0 centre (0, 0) radius 17.5 projected
  point P0 (0, 17.5)
ref_plane "РабПлоскость1" through (0, 0, 17.5) normal (0, 0, 1) x (1, 0, 0)
sketch "Эскиз7" plane through (0, 0, 17.5) normal (0, 0, 1) x (1, 0, 0)
  line L0 (17.5, 3.25) -> (-17.5, 3.25) projected
  circle A0 centre (-12.5, 3.25) radius 2.2
  line L1 (-17.5, 0) -> (-17.5, 3.25) projected
  dimension "d22" = 4.4
  dimension "d23" = 5
extrude "Выдавливание5" cut sketch "Эскиз7" against normal through all
properties part number "мини катушка3"
